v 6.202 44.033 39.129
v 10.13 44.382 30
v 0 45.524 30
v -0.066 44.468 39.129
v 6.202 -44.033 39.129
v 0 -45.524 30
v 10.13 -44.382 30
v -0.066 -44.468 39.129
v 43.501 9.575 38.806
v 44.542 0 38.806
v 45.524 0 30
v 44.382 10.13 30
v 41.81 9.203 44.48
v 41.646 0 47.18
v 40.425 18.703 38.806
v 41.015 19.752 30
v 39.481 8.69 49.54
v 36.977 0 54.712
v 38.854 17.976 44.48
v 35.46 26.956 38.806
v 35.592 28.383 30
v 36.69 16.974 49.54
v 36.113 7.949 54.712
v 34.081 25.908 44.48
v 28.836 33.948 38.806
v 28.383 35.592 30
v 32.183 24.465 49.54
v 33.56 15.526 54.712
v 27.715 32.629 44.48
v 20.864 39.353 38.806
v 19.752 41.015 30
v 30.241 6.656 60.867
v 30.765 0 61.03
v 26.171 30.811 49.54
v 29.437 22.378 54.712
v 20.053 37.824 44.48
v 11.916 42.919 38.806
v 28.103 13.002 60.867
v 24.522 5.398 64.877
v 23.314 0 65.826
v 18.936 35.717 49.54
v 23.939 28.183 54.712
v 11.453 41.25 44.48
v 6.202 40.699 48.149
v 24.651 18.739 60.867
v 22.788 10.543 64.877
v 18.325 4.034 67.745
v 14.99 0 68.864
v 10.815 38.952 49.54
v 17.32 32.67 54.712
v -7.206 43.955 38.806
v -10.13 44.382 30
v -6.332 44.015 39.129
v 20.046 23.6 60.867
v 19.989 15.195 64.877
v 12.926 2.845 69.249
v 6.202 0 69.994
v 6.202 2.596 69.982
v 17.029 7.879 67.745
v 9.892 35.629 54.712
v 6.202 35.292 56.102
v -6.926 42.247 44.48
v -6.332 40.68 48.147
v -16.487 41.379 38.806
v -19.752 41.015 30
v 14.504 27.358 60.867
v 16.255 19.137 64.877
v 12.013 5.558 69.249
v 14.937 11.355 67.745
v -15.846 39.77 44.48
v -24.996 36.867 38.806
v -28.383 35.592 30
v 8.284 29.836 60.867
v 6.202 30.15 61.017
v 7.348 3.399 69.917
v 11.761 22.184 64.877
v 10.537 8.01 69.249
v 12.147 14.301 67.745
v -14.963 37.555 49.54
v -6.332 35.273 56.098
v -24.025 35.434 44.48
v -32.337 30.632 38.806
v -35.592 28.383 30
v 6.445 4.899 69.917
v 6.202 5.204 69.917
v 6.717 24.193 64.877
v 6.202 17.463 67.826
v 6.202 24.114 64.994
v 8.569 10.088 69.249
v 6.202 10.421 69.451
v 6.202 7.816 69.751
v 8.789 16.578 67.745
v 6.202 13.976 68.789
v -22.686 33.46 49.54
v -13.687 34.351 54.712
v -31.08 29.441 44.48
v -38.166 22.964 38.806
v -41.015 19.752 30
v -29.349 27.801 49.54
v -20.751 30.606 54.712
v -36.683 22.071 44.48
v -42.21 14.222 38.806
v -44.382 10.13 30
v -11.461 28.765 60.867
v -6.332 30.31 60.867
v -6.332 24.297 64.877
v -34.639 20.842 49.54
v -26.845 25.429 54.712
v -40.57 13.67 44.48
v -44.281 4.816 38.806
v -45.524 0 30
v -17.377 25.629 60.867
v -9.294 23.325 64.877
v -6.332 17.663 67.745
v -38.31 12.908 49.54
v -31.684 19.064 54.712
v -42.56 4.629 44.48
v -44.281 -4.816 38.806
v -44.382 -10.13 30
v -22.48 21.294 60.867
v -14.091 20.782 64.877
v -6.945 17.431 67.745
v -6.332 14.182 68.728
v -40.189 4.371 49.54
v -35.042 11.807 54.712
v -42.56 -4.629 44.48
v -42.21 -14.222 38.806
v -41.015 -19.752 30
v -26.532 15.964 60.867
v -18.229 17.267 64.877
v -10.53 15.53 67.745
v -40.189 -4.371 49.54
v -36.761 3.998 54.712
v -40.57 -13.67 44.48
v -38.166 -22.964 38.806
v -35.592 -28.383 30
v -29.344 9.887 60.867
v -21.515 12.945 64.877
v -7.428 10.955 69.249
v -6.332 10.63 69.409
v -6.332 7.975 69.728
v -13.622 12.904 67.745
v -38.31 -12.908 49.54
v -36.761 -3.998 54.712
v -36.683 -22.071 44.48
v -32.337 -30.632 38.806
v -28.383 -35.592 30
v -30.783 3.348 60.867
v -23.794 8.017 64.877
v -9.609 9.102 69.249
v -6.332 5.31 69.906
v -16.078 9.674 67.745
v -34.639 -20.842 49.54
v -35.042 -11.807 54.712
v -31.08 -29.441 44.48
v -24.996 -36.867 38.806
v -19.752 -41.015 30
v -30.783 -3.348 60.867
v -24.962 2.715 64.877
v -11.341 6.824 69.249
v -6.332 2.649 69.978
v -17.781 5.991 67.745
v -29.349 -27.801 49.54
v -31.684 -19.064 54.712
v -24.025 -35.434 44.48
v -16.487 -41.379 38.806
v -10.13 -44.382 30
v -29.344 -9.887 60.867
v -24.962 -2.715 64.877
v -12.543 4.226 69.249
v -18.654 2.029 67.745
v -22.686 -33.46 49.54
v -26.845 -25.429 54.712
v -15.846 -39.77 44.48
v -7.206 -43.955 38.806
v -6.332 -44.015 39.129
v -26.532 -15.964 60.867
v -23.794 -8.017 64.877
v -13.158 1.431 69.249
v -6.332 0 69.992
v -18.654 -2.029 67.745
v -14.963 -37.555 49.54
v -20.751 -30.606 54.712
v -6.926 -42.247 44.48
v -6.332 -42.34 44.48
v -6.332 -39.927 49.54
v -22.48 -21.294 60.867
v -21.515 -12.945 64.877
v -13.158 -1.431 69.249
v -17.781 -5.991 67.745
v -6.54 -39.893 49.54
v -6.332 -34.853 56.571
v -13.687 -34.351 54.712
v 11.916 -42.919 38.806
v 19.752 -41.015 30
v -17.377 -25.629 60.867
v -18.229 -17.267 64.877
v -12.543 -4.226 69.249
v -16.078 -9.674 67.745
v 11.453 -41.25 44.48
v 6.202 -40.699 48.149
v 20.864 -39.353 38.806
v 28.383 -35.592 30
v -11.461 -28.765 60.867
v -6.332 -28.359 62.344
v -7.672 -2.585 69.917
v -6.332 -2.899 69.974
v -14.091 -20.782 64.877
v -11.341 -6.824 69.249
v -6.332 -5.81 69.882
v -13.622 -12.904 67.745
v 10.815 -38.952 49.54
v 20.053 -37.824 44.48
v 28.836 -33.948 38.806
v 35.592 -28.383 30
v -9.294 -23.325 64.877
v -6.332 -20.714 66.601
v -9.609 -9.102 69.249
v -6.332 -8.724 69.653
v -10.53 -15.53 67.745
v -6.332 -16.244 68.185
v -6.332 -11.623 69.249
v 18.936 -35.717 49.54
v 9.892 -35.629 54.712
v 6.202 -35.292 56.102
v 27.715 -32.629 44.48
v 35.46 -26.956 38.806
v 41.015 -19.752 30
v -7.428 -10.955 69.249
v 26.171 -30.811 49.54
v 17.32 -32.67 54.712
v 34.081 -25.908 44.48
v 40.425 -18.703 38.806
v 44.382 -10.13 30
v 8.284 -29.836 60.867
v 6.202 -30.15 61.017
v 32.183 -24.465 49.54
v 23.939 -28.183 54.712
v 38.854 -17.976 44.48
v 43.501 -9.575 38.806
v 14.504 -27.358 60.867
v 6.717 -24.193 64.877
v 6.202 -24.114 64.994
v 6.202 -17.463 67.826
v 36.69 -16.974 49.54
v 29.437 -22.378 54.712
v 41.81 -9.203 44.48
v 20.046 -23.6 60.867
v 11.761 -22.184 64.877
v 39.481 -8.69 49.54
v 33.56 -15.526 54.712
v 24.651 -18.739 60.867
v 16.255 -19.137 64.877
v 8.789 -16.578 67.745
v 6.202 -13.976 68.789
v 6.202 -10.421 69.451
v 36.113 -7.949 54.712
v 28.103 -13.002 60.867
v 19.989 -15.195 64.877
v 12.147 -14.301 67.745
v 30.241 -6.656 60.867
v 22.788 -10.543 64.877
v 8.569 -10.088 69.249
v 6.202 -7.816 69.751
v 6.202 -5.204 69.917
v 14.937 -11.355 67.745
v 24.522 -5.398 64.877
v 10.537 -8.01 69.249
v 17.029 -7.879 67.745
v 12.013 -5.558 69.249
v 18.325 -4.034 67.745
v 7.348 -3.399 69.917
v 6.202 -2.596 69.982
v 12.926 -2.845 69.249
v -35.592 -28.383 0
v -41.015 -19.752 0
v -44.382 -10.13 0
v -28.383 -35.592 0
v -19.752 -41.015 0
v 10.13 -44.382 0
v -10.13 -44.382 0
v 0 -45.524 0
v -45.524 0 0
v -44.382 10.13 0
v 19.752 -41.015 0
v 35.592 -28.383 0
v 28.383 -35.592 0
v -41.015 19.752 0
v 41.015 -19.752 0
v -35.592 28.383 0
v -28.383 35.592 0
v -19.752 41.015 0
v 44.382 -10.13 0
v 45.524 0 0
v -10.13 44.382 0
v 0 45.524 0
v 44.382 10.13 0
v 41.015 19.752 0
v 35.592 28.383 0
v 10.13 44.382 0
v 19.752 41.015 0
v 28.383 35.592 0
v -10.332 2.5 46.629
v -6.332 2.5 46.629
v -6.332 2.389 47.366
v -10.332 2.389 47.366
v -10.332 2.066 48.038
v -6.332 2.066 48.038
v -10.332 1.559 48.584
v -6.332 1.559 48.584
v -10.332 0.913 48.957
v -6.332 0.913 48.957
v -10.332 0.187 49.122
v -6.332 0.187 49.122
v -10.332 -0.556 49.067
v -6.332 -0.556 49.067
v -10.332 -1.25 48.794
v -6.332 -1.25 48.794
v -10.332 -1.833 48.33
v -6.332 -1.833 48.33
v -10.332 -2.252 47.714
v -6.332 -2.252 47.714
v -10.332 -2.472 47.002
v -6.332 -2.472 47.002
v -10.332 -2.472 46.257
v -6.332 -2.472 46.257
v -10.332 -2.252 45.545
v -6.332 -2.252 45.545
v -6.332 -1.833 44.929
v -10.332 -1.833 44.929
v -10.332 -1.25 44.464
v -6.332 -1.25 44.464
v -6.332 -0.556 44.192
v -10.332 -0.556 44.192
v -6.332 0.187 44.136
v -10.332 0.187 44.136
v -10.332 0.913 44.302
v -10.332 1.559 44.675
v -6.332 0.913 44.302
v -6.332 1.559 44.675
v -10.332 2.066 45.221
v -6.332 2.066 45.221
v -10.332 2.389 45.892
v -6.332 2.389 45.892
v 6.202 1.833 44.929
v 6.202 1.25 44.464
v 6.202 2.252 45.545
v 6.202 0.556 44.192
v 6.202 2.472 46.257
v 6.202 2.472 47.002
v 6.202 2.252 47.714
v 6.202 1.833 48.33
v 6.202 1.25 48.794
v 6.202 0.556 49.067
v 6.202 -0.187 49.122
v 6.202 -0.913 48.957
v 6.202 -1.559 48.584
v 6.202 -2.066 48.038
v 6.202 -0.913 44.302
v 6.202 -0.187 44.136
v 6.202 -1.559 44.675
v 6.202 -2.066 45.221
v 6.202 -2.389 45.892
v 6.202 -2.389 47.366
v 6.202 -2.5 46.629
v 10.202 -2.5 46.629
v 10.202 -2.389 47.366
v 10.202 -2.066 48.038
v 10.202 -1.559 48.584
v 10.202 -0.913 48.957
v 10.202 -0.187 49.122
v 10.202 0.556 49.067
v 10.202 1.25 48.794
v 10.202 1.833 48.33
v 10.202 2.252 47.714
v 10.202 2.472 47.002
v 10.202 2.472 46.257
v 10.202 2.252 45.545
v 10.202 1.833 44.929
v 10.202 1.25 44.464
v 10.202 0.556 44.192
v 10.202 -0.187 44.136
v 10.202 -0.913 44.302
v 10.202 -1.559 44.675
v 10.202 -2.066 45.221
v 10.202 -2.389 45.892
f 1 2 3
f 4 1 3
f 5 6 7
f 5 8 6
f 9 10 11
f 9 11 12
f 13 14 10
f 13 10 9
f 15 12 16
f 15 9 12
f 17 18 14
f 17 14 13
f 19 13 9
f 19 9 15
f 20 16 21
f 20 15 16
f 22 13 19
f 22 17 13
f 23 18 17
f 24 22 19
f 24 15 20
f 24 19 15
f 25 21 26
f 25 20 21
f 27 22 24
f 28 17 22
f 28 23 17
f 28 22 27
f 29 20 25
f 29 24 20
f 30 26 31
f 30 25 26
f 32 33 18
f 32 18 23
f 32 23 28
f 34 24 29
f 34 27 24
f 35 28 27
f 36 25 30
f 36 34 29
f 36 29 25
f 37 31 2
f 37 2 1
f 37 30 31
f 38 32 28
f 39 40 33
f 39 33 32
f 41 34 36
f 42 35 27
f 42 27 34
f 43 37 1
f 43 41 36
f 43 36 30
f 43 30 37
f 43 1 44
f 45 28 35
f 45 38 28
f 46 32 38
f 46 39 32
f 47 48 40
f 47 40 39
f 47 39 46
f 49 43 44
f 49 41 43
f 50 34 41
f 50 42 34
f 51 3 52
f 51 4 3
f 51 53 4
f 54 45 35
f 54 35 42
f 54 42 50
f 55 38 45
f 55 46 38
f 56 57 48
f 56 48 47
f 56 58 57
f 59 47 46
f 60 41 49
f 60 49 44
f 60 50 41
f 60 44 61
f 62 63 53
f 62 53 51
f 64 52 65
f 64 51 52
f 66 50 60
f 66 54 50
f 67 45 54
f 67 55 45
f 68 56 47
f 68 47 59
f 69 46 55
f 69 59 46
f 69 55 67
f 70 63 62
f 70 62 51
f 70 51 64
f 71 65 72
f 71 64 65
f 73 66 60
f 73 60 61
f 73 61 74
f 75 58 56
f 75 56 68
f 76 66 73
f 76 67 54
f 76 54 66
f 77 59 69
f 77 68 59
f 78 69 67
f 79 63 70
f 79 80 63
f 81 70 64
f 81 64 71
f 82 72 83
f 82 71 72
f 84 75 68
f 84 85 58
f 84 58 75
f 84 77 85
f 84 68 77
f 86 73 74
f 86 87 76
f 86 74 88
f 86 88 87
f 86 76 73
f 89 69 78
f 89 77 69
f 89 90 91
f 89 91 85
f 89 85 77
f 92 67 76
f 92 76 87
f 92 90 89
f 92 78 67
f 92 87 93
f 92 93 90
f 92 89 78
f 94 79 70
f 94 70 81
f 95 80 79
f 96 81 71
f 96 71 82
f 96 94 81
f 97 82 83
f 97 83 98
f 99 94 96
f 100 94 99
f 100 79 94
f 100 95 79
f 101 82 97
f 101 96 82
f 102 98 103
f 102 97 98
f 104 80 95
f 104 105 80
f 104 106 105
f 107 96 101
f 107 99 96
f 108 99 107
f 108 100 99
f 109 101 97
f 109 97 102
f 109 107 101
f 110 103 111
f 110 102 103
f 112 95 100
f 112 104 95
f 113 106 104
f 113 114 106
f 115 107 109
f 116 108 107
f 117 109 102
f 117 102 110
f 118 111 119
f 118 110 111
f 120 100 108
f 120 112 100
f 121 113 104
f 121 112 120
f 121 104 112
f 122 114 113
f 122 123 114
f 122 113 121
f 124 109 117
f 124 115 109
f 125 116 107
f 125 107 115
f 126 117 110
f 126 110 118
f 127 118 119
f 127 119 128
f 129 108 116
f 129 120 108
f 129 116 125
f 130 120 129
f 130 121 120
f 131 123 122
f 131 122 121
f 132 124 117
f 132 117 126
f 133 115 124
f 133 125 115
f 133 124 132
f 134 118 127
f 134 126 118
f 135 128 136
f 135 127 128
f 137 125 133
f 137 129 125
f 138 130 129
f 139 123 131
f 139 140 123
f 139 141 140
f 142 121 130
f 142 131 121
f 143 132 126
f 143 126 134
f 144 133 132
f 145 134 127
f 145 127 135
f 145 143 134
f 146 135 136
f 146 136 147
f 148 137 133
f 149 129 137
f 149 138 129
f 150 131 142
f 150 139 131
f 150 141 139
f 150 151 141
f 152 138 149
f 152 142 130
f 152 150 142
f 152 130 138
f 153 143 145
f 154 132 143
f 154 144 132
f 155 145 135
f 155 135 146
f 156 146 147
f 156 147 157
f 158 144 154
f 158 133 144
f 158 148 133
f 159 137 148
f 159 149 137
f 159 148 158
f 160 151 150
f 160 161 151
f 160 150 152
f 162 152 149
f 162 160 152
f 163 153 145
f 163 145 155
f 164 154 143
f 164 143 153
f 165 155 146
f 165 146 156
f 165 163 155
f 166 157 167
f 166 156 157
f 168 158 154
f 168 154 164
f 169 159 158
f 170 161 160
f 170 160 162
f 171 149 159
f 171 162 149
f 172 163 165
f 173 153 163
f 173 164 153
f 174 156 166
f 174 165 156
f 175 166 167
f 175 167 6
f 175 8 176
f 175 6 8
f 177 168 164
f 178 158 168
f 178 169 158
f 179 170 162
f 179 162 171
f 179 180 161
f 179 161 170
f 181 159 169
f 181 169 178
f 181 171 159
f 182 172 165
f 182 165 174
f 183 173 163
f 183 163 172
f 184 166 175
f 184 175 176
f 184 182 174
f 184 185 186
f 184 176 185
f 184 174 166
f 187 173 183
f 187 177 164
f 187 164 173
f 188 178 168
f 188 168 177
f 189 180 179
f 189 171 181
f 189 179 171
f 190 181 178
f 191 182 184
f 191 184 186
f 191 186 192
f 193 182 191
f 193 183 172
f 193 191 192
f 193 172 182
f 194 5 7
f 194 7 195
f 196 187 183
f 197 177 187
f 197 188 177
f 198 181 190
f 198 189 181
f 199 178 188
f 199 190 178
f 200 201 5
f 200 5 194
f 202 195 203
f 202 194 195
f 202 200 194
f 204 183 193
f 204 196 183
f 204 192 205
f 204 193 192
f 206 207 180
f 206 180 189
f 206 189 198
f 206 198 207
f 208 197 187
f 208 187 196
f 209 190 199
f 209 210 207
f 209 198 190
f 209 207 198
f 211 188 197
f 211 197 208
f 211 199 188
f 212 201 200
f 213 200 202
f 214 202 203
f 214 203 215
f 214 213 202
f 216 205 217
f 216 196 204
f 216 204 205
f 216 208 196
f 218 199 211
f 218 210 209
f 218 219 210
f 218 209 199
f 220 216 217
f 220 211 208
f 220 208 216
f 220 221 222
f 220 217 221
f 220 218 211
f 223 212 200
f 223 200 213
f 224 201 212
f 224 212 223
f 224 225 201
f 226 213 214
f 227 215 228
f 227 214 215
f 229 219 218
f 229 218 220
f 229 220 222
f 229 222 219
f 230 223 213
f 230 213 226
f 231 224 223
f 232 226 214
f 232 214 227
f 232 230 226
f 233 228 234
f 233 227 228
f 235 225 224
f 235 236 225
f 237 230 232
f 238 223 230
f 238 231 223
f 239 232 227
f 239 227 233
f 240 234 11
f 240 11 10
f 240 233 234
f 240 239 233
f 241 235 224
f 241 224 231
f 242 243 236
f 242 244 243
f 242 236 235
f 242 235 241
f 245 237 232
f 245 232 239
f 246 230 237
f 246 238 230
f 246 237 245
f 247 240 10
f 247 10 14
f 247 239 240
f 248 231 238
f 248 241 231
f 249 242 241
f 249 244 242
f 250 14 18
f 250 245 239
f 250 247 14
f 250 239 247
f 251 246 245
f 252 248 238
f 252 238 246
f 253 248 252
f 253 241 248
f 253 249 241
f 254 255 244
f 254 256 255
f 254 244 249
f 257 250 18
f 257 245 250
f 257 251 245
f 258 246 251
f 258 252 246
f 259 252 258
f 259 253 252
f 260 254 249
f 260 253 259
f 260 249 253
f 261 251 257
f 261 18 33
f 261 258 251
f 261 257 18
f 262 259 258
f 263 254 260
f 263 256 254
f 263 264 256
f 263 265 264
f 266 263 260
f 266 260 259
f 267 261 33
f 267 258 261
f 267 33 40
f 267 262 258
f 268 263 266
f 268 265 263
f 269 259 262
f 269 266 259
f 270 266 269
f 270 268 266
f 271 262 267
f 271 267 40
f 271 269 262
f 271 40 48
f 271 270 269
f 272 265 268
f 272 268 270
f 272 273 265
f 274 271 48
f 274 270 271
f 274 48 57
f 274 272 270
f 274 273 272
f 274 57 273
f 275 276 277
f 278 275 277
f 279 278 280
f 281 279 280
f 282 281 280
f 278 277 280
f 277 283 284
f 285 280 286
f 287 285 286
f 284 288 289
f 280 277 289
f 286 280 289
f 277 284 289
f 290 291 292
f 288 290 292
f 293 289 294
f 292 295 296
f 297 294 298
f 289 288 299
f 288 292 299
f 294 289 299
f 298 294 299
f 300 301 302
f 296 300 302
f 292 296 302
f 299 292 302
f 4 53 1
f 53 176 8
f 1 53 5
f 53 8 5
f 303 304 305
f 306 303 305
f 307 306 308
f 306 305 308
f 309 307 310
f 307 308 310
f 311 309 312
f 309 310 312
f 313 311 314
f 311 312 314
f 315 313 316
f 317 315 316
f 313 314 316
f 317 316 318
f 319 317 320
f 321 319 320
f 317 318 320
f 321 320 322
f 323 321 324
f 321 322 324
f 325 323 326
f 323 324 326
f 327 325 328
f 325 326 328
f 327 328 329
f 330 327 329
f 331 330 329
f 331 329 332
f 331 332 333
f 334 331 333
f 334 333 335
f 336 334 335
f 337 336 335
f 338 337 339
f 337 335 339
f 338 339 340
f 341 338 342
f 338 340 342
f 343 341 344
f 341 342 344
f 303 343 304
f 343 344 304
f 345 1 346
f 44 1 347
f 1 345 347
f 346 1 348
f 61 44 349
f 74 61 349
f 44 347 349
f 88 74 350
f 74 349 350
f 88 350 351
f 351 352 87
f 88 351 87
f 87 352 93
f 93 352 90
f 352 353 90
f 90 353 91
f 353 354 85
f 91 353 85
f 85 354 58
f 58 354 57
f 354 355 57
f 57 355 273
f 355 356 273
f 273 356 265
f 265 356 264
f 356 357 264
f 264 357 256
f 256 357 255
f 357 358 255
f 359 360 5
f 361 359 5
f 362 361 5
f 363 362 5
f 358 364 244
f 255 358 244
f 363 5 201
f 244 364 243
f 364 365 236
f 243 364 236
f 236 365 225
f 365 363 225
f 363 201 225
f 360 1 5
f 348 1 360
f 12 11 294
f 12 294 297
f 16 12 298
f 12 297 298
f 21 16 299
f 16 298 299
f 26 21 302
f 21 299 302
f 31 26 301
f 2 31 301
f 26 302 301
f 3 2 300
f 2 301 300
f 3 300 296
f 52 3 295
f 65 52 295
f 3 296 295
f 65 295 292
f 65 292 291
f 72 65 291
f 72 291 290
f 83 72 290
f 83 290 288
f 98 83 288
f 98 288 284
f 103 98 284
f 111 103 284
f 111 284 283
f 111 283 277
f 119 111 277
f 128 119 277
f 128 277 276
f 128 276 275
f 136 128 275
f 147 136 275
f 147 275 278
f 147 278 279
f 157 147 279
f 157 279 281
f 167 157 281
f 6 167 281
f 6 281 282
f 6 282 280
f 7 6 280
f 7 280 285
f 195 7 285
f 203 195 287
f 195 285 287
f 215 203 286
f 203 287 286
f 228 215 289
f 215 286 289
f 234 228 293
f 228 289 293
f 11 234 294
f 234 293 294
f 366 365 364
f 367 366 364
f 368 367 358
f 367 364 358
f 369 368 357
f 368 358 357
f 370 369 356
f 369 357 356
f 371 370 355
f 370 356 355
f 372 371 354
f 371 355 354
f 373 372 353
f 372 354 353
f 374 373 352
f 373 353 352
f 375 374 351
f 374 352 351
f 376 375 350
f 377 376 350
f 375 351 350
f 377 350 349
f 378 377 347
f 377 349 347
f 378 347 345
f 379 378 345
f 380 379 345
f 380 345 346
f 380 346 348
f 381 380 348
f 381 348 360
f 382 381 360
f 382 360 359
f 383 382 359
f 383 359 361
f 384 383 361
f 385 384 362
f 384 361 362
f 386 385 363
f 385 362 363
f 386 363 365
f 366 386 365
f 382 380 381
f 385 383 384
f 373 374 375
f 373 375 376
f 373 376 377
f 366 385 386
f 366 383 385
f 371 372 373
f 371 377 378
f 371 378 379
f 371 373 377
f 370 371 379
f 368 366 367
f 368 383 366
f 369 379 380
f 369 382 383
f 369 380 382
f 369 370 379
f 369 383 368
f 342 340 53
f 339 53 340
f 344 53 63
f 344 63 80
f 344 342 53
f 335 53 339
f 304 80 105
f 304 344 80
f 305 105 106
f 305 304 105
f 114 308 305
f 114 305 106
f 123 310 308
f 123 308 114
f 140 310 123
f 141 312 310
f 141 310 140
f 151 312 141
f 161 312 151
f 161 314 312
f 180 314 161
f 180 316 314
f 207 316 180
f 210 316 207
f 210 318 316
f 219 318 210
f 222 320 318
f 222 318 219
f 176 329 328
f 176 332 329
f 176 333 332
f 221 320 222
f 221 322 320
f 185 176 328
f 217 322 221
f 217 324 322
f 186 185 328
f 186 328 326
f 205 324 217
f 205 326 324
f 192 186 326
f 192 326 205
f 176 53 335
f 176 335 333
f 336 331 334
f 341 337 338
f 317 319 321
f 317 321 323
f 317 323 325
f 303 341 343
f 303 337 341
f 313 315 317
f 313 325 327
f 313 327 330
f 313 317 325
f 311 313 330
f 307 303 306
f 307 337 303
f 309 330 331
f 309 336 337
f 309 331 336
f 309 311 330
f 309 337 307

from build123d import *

# Parameters (mm, degrees)
F0_R      = 45.5235141672
F1_DEPTH  = 20
F2_DEPTH  = 50
F3_R      = 40
F4_W      = 12.5344563276
F4_H      = 31.0147441924
F5_DEPTH  = 100
F7_DEPTH  = 100
F8_R      = 2.5
F9_DEPTH  = 4
F10_R     = 2.5
F11_DEPTH = 4


with BuildPart() as f1:
    # F0 (on Top) → F1 (new body)
    with BuildSketch(Plane.XY):
        Circle(F0_R)
    extrude(amount=F1_DEPTH)

    # F2 (add): a face of the model
    f2_faces = [f1.faces().sort_by_distance(p)[0] for p in [
        (0, 0, 20),
    ]]
    extrude(f2_faces, amount=F2_DEPTH)

    # F3
    f3_edges = [f1.edges().sort_by_distance(p)[0] for p in [
        (-45.523514, 0, 70),
    ]]
    fillet(f3_edges, radius=F3_R)

    # F4 (on Front) → F5 (cut)
    with BuildSketch(Plane.XZ):
        with Locations((-0.0651595183, 54.6367447823)):
            Rectangle(F4_W, F4_H)
    extrude(amount=-F5_DEPTH, mode=Mode.SUBTRACT)

    # F6 (on face) → F7 (cut)
    with BuildSketch(Plane(origin=(0, 0, 0), x_dir=(-1, 0, 0), z_dir=(0, 1, 0))):
        with BuildLine():
            ThreePointArc((-5.5235141672, 70), (-5.8628036122, 69.9985610075), (-6.2020686455, 69.9942441336))
            Line((-6.2020686455, 69.9942441336), (-6.2020686455, 39.1293726861))
            Line((-6.2020686455, 39.1293726861), (6.3323876821, 39.1293726861))
            Line((6.3323876821, 39.1293726861), (6.3323876821, 69.9918207092))
            add(Edge.make_bspline(
                [(6.3323876821, 69.9918207092), (6.1301968719, 69.9959102152), (5.927978494, 69.9986367384), (5.7257463298, 70), (5.5235141672, 70)],
                knots=[0.6079316836, 0.6079316836, 0.6079316836, 0.6079316836, 0.6079316836, 1, 1, 1, 1, 1], degree=4))
            Line((5.5235141672, 70), (-5.5235141672, 70))
        make_face()
    extrude(amount=-F7_DEPTH, mode=Mode.SUBTRACT)

    # F8 (on face) → F9 (cut)
    with BuildSketch(Plane.YZ.offset(-6.3323876821)):
        with Locations((0, 46.6293726861)):
            Circle(F8_R)
    extrude(amount=-F9_DEPTH, mode=Mode.SUBTRACT)

    # F10 (on face) → F11 (cut)
    with BuildSketch(Plane(origin=(6.2020686455, 0, 0), x_dir=(0, -1, 0), z_dir=(-1, 0, 0))):
        with Locations((0, 46.6293726861)):
            Circle(F10_R)
    extrude(amount=-F11_DEPTH, mode=Mode.SUBTRACT)


solid = f1.part
